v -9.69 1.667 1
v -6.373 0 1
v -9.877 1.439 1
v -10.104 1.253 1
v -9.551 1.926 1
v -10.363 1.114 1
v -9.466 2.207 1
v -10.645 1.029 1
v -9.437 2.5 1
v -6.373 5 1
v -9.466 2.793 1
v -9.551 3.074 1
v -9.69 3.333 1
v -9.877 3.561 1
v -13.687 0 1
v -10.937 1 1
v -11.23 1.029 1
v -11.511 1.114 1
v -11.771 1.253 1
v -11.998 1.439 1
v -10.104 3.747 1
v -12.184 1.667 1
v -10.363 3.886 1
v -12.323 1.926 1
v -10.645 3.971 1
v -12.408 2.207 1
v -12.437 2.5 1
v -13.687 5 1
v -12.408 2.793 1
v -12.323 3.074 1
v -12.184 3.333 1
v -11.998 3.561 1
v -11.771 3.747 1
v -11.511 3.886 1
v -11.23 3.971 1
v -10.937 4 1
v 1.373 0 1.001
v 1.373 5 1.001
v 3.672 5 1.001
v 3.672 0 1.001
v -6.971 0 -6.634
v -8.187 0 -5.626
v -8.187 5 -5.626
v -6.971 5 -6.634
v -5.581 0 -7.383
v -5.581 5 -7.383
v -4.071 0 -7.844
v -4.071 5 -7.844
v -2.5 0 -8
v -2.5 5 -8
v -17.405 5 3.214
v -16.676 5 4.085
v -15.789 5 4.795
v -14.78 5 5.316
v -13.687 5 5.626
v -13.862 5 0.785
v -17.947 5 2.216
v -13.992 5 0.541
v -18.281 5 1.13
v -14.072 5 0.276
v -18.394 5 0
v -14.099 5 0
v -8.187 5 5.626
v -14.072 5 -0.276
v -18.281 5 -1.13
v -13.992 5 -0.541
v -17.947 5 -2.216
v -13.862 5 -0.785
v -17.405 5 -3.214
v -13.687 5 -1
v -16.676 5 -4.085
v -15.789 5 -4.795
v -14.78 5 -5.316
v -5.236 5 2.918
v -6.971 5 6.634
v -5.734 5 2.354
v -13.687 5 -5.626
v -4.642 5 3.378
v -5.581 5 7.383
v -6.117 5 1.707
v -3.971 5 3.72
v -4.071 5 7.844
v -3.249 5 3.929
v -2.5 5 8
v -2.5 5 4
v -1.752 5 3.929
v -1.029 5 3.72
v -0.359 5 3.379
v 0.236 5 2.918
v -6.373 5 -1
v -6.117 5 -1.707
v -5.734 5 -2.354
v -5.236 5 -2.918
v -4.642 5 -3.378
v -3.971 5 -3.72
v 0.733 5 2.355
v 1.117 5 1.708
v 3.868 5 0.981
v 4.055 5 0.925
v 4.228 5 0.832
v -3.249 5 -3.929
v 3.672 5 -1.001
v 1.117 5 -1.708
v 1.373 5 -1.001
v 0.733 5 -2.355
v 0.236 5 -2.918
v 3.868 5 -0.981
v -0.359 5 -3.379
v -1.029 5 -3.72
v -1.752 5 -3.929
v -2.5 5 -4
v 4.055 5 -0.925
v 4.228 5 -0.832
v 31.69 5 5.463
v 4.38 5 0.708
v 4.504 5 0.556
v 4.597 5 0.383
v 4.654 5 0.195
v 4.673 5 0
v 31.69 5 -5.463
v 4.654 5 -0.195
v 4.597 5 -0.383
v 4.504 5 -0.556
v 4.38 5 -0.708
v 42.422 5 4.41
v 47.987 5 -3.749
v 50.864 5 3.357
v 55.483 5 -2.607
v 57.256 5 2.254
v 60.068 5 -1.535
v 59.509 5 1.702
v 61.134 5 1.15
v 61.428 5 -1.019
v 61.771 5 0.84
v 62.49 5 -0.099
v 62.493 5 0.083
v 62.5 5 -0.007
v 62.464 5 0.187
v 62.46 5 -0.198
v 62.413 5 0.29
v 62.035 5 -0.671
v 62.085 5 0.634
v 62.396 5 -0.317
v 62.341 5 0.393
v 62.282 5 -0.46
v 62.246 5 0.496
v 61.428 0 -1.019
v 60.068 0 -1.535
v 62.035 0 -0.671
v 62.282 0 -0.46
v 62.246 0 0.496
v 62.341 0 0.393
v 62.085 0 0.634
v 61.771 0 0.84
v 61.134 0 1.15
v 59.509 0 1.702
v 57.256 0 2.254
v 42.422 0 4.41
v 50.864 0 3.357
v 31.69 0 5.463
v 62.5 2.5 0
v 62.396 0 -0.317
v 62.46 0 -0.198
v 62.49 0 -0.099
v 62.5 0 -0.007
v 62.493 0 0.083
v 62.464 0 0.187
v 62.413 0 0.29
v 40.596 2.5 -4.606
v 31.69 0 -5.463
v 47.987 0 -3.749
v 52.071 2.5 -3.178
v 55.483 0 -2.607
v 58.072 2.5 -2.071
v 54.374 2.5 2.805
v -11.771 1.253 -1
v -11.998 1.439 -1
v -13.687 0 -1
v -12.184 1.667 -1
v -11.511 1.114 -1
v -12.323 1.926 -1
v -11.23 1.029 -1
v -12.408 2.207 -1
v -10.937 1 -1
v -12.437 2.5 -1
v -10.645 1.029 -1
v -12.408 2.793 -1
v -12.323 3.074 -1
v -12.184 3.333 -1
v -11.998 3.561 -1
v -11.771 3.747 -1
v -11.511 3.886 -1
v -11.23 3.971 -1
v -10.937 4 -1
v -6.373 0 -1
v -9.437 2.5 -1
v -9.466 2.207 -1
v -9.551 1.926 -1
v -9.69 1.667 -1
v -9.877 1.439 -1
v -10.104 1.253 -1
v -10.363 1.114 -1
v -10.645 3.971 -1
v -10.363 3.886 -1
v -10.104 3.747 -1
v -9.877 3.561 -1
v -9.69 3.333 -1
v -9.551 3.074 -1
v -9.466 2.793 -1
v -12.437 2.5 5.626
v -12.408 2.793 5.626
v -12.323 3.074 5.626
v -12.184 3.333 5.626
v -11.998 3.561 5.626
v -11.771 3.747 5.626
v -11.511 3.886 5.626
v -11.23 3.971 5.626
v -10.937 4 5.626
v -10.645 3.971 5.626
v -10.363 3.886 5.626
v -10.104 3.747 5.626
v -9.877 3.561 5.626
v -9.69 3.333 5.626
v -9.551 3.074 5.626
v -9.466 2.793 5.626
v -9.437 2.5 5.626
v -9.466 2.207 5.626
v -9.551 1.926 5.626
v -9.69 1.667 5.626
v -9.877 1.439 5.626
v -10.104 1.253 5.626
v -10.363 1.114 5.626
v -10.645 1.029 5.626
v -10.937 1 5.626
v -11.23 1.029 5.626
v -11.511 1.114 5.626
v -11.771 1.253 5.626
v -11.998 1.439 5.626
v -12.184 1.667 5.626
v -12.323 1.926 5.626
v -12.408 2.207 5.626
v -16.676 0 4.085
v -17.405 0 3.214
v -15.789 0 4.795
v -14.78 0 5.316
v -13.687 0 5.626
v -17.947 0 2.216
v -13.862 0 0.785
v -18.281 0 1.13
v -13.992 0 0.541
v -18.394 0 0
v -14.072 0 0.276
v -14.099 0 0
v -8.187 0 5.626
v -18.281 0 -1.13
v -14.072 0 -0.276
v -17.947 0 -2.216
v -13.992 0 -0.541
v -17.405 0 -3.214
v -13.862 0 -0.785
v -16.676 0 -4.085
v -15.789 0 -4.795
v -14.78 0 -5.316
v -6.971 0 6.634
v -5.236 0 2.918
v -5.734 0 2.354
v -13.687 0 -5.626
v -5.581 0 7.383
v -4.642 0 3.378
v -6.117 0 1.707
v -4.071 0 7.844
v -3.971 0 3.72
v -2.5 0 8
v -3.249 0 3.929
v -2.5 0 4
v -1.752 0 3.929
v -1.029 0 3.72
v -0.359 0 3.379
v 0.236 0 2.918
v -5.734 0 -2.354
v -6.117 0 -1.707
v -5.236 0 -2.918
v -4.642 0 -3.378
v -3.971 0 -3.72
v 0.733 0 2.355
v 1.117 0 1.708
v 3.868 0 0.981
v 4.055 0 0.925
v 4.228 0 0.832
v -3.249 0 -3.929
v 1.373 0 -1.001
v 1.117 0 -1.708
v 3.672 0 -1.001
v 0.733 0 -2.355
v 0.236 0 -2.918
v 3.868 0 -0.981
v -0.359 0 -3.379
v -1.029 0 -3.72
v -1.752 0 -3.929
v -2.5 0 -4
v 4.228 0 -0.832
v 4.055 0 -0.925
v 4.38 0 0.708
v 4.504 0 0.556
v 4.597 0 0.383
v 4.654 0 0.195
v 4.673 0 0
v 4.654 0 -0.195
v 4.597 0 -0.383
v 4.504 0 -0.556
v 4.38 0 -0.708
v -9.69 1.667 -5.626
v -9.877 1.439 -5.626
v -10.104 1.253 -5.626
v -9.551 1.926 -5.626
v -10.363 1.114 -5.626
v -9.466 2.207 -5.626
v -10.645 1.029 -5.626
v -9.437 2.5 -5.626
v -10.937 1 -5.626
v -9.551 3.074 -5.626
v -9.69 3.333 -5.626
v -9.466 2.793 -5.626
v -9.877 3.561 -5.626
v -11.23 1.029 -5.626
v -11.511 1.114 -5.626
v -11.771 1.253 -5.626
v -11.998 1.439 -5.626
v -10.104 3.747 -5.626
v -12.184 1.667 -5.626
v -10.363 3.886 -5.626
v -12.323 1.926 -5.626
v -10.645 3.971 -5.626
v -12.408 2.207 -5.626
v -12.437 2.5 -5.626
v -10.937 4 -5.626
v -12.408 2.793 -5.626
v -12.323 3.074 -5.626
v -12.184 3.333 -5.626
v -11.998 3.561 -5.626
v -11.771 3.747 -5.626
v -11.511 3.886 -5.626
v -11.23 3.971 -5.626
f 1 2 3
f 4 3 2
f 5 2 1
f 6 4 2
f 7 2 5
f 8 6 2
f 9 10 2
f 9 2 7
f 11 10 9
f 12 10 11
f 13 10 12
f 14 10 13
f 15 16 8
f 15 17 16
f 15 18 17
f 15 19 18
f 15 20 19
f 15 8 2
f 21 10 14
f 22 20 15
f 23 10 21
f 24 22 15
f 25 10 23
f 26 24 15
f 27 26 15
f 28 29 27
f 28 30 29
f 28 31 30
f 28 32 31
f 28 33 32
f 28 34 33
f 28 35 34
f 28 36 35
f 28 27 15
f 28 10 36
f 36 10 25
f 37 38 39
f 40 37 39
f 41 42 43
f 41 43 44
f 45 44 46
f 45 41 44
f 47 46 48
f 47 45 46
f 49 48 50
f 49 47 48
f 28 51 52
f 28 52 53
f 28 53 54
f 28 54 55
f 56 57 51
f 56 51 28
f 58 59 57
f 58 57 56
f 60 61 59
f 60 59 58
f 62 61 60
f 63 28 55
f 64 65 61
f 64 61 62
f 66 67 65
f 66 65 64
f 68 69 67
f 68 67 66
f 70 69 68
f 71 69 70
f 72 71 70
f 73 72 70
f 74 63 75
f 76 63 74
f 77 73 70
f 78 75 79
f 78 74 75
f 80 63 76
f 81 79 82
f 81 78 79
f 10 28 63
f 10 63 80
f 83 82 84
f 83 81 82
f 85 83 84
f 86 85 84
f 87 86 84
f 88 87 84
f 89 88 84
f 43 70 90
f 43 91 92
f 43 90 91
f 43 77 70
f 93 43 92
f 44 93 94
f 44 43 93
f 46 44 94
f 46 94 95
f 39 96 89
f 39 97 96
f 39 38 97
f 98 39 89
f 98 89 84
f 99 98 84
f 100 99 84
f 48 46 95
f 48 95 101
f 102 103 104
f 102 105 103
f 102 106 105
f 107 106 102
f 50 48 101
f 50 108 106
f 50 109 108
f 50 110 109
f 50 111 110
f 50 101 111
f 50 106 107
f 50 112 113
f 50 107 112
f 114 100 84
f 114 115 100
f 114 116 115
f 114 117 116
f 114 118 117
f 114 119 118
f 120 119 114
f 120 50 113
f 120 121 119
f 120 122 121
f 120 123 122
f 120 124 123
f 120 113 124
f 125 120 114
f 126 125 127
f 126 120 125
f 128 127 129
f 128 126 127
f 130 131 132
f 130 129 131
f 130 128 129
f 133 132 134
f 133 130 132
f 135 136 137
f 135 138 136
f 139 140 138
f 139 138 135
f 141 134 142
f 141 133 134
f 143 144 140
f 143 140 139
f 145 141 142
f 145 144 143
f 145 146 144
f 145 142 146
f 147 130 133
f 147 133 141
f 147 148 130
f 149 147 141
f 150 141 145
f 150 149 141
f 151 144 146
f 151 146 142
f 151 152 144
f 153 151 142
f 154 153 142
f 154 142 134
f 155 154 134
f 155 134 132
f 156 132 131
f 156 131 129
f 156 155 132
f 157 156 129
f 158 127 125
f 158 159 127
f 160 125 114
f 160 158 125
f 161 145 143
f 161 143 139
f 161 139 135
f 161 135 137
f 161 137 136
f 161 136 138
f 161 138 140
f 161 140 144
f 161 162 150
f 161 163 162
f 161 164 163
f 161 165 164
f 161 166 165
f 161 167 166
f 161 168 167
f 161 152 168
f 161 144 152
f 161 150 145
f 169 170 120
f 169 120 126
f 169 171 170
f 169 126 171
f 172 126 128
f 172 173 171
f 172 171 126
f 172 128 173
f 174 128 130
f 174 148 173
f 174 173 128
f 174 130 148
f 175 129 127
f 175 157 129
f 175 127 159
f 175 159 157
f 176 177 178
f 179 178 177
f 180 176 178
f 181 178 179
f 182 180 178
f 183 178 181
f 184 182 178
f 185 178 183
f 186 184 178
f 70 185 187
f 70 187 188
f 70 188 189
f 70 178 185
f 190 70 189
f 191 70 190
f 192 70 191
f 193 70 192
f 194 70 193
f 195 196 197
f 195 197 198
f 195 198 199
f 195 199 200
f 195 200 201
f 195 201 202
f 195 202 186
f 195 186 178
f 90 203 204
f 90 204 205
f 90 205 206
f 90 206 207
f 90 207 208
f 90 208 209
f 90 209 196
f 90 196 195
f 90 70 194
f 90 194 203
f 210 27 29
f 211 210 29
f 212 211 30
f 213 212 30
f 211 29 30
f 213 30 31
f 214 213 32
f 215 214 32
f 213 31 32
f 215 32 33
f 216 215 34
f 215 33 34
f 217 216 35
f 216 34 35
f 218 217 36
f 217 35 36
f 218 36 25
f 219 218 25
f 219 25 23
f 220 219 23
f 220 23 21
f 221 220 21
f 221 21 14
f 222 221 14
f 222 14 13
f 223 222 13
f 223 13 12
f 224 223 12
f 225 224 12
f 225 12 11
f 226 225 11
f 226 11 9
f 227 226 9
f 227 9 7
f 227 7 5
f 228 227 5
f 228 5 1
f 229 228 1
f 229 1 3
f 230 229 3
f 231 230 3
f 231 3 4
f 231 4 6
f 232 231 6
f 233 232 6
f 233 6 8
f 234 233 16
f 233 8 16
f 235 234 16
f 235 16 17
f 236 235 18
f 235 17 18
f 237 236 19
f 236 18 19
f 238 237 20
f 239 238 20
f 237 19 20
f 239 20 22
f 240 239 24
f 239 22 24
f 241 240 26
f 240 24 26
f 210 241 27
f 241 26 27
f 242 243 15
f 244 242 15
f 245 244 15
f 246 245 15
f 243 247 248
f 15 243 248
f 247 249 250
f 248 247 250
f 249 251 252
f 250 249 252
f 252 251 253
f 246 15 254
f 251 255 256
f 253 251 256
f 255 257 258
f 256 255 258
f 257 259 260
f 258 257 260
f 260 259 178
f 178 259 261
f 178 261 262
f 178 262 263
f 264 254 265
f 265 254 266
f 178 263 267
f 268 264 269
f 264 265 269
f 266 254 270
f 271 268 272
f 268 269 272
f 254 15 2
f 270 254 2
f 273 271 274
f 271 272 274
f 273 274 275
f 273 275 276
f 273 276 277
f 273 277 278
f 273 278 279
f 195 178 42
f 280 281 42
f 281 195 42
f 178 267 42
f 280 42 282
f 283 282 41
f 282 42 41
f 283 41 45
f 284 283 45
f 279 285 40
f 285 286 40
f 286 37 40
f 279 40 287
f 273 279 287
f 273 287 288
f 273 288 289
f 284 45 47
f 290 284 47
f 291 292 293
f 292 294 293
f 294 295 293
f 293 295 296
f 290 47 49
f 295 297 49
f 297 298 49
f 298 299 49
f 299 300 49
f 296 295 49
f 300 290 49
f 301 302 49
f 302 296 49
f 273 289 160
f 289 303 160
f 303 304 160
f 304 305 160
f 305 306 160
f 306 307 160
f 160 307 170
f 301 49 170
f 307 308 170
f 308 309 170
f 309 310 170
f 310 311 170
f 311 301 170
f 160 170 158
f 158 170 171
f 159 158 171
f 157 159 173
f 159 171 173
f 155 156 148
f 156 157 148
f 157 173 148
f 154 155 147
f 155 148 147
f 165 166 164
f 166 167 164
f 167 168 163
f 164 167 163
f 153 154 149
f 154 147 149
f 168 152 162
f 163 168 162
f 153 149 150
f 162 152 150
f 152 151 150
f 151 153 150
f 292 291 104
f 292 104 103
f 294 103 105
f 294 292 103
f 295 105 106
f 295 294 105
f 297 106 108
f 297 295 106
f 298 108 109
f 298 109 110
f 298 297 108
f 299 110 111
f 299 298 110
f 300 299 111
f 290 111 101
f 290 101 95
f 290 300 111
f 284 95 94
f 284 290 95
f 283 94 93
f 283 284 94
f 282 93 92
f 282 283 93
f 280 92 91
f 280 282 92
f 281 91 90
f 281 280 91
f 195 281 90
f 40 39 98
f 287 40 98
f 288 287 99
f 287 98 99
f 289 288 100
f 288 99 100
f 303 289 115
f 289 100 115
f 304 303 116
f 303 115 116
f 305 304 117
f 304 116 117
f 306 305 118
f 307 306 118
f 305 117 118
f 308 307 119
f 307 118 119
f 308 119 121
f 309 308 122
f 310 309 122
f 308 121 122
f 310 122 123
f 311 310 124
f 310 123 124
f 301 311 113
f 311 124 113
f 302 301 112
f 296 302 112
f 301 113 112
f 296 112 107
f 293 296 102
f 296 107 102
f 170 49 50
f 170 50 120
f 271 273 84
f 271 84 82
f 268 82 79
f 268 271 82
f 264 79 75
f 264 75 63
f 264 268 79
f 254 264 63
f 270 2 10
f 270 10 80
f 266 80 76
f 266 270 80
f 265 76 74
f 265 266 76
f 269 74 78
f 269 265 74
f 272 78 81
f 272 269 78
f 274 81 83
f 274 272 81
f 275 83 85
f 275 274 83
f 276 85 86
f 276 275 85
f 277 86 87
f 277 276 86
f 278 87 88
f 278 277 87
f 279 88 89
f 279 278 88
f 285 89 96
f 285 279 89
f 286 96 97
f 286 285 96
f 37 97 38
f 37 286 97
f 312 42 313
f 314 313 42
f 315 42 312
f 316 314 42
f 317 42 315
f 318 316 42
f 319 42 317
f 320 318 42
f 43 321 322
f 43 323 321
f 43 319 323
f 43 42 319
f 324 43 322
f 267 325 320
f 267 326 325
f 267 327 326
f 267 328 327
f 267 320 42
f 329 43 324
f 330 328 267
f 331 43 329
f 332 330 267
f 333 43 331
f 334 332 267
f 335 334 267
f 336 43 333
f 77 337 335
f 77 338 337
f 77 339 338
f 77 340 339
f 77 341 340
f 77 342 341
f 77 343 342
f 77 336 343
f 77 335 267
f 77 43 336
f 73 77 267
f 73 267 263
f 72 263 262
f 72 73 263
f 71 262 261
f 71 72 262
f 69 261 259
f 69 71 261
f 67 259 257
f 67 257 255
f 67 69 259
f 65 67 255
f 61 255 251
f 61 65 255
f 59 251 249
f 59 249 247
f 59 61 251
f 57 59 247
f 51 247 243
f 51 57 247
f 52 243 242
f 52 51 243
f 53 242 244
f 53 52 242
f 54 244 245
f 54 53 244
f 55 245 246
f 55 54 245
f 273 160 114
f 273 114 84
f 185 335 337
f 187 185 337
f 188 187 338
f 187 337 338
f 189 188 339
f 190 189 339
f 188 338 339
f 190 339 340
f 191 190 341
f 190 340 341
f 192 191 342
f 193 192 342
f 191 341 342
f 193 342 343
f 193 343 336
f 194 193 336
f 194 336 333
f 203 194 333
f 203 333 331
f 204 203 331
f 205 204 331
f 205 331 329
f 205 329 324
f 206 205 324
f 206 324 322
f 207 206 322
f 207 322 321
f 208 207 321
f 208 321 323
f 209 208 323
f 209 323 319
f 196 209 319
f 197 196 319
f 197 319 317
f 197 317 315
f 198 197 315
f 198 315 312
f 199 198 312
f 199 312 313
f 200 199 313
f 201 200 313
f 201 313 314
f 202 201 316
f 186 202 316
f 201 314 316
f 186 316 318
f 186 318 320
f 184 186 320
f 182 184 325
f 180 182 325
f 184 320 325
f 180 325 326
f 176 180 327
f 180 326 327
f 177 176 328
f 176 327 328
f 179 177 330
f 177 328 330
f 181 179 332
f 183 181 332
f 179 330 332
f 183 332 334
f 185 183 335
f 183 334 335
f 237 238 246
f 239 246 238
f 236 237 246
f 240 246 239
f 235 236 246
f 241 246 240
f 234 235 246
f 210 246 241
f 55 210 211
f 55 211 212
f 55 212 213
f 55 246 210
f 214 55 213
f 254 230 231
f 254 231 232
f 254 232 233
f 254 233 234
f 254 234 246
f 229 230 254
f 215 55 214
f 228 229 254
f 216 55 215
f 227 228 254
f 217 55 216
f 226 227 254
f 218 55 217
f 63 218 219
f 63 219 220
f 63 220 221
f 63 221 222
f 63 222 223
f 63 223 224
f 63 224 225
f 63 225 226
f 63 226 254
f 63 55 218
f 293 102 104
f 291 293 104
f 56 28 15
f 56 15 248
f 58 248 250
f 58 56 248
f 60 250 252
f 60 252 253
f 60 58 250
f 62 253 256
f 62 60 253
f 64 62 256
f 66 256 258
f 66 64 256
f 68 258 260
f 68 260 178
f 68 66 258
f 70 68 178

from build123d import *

# Parameters (mm, degrees)
SKETCH1_R               = 4
BOSS_EXTRUDE1_DEPTH     = 5
CUT_EXTRUDE1_DEPTH      = 6.0000001
BOSS_EXTRUDE3_DEPTH     = 5
SKETCH7_R               = 1.5
CUT_EXTRUDE2_DEPTH      = 3.373709786
CUT_EXTRUDE2_DEPTH_BACK = 14.626290414


with BuildPart() as part:
    # Sketch1 → Boss-Extrude1 (new body)
    with BuildSketch(Plane(origin=(0, 0, 0), x_dir=(1, 0, 0), z_dir=(0, 1, 0))):
        with BuildLine():
            Line((-2.5, 8), (31.690345961, 5.462833873))
            add(Edge.make_bspline(
                [(31.690345961, 5.462833873), (93.309654039, 0), (31.690345961, -5.462833873)],
                knots=[0, 0, 0, 1, 1, 1], degree=2))
            Line((31.690345961, -5.462833873), (-2.5, -8))
            ThreePointArc((-2.5, -8), (-10.5, 0), (-2.5, 8))
        make_face()
        with Locations((-2.5, 0)):
            Circle(SKETCH1_R, mode=Mode.SUBTRACT)
    extrude(amount=BOSS_EXTRUDE1_DEPTH)

    # Sketch5 → Cut-Extrude1 (cut, through all)
    with BuildSketch(Plane(origin=(0, 5, 0), x_dir=(1, 0, 0), z_dir=(0, 1, 0))):
        with BuildLine():
            Line((1.372805365, -1.000689064), (3.672323333, -1.000689064))
            ThreePointArc((3.672323333, -1.000689064), (4.673012397, 0), (3.672323333, 1.000689064))
            Line((3.672323333, 1.000689064), (1.372805365, 1.000689064))
            ThreePointArc((1.372805365, 1.000689064), (1.5, 0), (1.372805365, -1.000689064))
        make_face()
        with BuildLine():
            Line((-6.372983346, 1), (-10.437253933, 1))
            ThreePointArc((-10.437253933, 1), (-10.5, 0), (-10.437253933, -1))
            Line((-10.437253933, -1), (-6.372983346, -1))
            ThreePointArc((-6.372983346, -1), (-6.5, 0), (-6.372983346, 1))
        make_face()
    extrude(amount=-CUT_EXTRUDE1_DEPTH, mode=Mode.SUBTRACT)

    # Sketch6 → Boss-Extrude3 (add)
    with BuildSketch(Plane(origin=(0, 5, 0), x_dir=(1, 0, 0), z_dir=(0, 1, 0))):
        with BuildLine():
            Line((-13.687253933, 1), (-10.437253933, 1))
            ThreePointArc((-10.437253933, 1), (-9.694264672, 3.498936386), (-8.187253933, 5.626290314))
            Line((-8.187253933, 5.626290314), (-13.687253933, 5.626290314))
            ThreePointArc((-13.687253933, 5.626290314), (-18.394261839, 0), (-13.687253933, -5.626290314))
            Line((-13.687253933, -5.626290314), (-8.187253933, -5.626290314))
            ThreePointArc((-8.187253933, -5.626290314), (-9.694264672, -3.498936386), (-10.437253933, -1))
            Line((-10.437253933, -1), (-13.687253933, -1))
            ThreePointArc((-13.687253933, -1), (-14.098831021, 0), (-13.687253933, 1))
        make_face()
    extrude(amount=-BOSS_EXTRUDE3_DEPTH)

    # Sketch7 → Cut-Extrude2 (cut, two sides)
    with BuildSketch(Plane(origin=(0, 0, -5.626290314), x_dir=(-1, 0, 0), z_dir=(0, 0, -1))) as cut_extrude2_sk:
        with Locations((10.937253933, 2.5)):
            Circle(SKETCH7_R)
    extrude(amount=CUT_EXTRUDE2_DEPTH, mode=Mode.SUBTRACT)
    extrude(cut_extrude2_sk.sketch, amount=-CUT_EXTRUDE2_DEPTH_BACK, mode=Mode.SUBTRACT)


solid = part.part
